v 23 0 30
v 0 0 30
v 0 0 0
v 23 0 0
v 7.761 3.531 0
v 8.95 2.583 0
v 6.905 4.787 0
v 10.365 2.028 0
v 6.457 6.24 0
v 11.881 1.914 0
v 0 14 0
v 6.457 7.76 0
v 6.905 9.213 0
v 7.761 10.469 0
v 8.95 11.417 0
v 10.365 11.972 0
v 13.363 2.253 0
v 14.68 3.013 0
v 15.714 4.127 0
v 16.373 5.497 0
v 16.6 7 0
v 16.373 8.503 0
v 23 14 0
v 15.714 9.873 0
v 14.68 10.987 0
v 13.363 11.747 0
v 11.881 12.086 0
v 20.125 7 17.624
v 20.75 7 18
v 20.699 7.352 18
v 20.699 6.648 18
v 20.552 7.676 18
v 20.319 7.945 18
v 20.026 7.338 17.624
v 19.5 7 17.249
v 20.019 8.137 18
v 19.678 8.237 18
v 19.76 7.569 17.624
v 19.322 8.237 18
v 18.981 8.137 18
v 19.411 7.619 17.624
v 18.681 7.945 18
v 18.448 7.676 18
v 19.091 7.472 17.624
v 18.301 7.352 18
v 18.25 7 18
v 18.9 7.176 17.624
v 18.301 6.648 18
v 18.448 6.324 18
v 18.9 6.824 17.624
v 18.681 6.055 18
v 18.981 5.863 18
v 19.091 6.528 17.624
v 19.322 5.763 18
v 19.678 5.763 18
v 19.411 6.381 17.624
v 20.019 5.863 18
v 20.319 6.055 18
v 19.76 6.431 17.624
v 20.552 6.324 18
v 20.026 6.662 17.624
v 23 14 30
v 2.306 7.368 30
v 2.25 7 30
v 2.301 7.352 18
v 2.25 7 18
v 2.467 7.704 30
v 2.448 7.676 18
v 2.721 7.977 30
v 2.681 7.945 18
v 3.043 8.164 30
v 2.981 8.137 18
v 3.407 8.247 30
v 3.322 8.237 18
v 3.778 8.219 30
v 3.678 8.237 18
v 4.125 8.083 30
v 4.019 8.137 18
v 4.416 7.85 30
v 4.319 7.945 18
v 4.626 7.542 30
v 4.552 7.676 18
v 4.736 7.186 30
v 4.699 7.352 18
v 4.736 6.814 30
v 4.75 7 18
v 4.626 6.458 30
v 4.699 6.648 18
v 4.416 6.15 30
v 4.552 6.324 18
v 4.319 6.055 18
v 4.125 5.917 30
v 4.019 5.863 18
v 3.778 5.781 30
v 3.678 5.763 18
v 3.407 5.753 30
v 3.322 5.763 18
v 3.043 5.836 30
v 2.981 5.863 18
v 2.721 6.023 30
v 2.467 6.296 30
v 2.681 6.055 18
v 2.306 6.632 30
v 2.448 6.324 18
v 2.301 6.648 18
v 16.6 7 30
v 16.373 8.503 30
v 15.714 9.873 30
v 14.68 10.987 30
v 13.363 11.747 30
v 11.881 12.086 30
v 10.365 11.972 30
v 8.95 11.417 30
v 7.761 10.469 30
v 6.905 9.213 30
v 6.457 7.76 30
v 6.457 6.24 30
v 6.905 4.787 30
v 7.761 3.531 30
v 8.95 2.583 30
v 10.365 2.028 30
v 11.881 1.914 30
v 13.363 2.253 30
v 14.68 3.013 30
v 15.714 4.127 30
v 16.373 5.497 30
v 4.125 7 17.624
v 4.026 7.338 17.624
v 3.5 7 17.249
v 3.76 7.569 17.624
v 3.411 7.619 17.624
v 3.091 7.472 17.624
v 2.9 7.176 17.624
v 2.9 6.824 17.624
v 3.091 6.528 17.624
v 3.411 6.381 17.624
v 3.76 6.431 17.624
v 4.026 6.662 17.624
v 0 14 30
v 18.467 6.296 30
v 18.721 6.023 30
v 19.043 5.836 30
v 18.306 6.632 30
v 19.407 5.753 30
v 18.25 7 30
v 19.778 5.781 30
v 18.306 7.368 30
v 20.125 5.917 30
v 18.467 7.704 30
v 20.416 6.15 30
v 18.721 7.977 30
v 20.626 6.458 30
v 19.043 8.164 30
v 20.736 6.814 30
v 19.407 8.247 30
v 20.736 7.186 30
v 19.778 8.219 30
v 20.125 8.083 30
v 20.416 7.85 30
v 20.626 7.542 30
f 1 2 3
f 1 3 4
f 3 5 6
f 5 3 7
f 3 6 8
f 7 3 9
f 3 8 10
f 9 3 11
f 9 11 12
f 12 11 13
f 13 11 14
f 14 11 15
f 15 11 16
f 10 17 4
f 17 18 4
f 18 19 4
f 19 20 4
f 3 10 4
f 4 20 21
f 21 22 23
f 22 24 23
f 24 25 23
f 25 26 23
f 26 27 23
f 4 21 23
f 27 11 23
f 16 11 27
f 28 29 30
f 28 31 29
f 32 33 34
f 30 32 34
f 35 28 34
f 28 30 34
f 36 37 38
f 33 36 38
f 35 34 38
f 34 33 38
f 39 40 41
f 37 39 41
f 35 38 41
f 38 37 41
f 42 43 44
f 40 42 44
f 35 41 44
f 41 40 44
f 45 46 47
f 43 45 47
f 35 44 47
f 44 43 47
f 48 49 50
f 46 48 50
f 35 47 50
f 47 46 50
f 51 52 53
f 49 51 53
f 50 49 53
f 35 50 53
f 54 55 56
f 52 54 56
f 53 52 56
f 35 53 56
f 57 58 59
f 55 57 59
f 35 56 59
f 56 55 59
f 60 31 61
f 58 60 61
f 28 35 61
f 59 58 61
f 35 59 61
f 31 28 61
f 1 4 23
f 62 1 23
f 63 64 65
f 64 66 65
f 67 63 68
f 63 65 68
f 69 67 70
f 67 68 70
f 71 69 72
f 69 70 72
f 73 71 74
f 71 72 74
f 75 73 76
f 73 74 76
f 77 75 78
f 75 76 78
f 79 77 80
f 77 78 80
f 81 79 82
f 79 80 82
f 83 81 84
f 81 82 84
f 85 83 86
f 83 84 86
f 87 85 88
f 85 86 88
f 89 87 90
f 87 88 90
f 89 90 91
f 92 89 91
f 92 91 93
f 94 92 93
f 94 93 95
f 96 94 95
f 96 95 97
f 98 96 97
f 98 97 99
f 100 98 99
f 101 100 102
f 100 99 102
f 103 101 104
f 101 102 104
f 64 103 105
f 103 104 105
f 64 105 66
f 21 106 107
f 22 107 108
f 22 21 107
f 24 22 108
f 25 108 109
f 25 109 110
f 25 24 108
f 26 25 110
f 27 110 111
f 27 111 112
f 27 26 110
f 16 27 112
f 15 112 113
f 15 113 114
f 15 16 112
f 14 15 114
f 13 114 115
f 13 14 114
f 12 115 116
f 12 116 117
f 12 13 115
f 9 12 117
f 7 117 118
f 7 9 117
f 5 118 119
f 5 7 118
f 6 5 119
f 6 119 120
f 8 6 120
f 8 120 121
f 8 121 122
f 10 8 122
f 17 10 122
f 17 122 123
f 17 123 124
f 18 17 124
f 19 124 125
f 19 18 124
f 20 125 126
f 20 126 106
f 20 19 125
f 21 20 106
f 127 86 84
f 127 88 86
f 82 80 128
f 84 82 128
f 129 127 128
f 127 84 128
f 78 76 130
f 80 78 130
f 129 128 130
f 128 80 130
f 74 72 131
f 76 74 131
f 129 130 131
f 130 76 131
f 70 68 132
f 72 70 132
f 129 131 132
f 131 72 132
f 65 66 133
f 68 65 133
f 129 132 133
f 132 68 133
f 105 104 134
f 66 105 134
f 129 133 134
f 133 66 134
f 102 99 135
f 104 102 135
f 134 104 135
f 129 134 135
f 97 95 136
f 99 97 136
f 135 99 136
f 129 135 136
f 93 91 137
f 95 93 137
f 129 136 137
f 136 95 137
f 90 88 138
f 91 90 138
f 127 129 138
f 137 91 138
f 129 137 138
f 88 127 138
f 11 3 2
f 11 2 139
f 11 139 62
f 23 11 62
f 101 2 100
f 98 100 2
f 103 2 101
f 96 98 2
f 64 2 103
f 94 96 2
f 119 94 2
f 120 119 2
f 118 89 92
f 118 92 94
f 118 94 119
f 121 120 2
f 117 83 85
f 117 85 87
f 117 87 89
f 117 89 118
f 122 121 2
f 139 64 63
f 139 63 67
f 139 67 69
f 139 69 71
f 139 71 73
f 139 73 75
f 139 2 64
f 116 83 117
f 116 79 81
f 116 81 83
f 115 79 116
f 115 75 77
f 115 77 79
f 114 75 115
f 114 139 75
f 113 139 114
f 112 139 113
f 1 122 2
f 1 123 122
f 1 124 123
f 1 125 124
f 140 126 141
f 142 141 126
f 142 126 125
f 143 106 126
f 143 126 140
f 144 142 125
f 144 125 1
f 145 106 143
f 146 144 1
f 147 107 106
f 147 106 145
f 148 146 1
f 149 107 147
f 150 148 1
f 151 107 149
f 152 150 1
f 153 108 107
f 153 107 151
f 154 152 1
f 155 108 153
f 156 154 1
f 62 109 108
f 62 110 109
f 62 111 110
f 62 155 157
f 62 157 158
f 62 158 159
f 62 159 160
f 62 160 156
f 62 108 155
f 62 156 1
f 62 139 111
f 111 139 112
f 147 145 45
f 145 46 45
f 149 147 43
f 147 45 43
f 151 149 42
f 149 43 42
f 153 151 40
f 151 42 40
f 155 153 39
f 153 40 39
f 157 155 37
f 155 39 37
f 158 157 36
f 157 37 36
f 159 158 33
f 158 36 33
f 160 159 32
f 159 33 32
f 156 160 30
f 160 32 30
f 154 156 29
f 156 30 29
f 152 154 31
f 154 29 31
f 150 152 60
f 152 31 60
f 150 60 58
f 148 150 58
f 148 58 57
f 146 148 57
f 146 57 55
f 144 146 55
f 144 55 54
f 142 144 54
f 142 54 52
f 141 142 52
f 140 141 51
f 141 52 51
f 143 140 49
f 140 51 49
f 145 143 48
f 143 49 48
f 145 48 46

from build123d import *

# Parameters (mm, degrees)
CROQUIS1_W                                     = 23
CROQUIS1_H                                     = 14
CROQUIS1_R                                     = 5.1
SALIENTE_EXTRUIR1_DEPTH                        = 30
PERFORADOR_PARA_ROSCAR_PARA_MACHO_DE_ROS_D     = 2.5
PERFORADOR_PARA_ROSCAR_PARA_MACHO_DE_ROS_DEPTH = 12
PERFORADOR_PARA_ROSCAR_PARA_MACHO_DE_ROS_TIP   = 0.751075774


with BuildPart() as part:
    # Croquis1 → Saliente-Extruir1 (new body)
    with BuildSketch(Plane.XY):
        with Locations((11.5, 7)):
            Rectangle(CROQUIS1_W, CROQUIS1_H)
        with Locations((11.5, 7)):
            Circle(CROQUIS1_R, mode=Mode.SUBTRACT)
    extrude(amount=SALIENTE_EXTRUIR1_DEPTH)

    # Perforador para roscar para macho de roscar para M31
    with Locations(Plane.XY.offset(30)):
        with Locations((3.5, 7), (19.5, 7)):
            Hole(PERFORADOR_PARA_ROSCAR_PARA_MACHO_DE_ROS_D / 2, depth=PERFORADOR_PARA_ROSCAR_PARA_MACHO_DE_ROS_DEPTH)
            with Locations((0, 0, -(PERFORADOR_PARA_ROSCAR_PARA_MACHO_DE_ROS_DEPTH + PERFORADOR_PARA_ROSCAR_PARA_MACHO_DE_ROS_TIP / 2))):  # 118° drill point
                Cone(0, PERFORADOR_PARA_ROSCAR_PARA_MACHO_DE_ROS_D / 2, PERFORADOR_PARA_ROSCAR_PARA_MACHO_DE_ROS_TIP, mode=Mode.SUBTRACT)


solid = part.part
